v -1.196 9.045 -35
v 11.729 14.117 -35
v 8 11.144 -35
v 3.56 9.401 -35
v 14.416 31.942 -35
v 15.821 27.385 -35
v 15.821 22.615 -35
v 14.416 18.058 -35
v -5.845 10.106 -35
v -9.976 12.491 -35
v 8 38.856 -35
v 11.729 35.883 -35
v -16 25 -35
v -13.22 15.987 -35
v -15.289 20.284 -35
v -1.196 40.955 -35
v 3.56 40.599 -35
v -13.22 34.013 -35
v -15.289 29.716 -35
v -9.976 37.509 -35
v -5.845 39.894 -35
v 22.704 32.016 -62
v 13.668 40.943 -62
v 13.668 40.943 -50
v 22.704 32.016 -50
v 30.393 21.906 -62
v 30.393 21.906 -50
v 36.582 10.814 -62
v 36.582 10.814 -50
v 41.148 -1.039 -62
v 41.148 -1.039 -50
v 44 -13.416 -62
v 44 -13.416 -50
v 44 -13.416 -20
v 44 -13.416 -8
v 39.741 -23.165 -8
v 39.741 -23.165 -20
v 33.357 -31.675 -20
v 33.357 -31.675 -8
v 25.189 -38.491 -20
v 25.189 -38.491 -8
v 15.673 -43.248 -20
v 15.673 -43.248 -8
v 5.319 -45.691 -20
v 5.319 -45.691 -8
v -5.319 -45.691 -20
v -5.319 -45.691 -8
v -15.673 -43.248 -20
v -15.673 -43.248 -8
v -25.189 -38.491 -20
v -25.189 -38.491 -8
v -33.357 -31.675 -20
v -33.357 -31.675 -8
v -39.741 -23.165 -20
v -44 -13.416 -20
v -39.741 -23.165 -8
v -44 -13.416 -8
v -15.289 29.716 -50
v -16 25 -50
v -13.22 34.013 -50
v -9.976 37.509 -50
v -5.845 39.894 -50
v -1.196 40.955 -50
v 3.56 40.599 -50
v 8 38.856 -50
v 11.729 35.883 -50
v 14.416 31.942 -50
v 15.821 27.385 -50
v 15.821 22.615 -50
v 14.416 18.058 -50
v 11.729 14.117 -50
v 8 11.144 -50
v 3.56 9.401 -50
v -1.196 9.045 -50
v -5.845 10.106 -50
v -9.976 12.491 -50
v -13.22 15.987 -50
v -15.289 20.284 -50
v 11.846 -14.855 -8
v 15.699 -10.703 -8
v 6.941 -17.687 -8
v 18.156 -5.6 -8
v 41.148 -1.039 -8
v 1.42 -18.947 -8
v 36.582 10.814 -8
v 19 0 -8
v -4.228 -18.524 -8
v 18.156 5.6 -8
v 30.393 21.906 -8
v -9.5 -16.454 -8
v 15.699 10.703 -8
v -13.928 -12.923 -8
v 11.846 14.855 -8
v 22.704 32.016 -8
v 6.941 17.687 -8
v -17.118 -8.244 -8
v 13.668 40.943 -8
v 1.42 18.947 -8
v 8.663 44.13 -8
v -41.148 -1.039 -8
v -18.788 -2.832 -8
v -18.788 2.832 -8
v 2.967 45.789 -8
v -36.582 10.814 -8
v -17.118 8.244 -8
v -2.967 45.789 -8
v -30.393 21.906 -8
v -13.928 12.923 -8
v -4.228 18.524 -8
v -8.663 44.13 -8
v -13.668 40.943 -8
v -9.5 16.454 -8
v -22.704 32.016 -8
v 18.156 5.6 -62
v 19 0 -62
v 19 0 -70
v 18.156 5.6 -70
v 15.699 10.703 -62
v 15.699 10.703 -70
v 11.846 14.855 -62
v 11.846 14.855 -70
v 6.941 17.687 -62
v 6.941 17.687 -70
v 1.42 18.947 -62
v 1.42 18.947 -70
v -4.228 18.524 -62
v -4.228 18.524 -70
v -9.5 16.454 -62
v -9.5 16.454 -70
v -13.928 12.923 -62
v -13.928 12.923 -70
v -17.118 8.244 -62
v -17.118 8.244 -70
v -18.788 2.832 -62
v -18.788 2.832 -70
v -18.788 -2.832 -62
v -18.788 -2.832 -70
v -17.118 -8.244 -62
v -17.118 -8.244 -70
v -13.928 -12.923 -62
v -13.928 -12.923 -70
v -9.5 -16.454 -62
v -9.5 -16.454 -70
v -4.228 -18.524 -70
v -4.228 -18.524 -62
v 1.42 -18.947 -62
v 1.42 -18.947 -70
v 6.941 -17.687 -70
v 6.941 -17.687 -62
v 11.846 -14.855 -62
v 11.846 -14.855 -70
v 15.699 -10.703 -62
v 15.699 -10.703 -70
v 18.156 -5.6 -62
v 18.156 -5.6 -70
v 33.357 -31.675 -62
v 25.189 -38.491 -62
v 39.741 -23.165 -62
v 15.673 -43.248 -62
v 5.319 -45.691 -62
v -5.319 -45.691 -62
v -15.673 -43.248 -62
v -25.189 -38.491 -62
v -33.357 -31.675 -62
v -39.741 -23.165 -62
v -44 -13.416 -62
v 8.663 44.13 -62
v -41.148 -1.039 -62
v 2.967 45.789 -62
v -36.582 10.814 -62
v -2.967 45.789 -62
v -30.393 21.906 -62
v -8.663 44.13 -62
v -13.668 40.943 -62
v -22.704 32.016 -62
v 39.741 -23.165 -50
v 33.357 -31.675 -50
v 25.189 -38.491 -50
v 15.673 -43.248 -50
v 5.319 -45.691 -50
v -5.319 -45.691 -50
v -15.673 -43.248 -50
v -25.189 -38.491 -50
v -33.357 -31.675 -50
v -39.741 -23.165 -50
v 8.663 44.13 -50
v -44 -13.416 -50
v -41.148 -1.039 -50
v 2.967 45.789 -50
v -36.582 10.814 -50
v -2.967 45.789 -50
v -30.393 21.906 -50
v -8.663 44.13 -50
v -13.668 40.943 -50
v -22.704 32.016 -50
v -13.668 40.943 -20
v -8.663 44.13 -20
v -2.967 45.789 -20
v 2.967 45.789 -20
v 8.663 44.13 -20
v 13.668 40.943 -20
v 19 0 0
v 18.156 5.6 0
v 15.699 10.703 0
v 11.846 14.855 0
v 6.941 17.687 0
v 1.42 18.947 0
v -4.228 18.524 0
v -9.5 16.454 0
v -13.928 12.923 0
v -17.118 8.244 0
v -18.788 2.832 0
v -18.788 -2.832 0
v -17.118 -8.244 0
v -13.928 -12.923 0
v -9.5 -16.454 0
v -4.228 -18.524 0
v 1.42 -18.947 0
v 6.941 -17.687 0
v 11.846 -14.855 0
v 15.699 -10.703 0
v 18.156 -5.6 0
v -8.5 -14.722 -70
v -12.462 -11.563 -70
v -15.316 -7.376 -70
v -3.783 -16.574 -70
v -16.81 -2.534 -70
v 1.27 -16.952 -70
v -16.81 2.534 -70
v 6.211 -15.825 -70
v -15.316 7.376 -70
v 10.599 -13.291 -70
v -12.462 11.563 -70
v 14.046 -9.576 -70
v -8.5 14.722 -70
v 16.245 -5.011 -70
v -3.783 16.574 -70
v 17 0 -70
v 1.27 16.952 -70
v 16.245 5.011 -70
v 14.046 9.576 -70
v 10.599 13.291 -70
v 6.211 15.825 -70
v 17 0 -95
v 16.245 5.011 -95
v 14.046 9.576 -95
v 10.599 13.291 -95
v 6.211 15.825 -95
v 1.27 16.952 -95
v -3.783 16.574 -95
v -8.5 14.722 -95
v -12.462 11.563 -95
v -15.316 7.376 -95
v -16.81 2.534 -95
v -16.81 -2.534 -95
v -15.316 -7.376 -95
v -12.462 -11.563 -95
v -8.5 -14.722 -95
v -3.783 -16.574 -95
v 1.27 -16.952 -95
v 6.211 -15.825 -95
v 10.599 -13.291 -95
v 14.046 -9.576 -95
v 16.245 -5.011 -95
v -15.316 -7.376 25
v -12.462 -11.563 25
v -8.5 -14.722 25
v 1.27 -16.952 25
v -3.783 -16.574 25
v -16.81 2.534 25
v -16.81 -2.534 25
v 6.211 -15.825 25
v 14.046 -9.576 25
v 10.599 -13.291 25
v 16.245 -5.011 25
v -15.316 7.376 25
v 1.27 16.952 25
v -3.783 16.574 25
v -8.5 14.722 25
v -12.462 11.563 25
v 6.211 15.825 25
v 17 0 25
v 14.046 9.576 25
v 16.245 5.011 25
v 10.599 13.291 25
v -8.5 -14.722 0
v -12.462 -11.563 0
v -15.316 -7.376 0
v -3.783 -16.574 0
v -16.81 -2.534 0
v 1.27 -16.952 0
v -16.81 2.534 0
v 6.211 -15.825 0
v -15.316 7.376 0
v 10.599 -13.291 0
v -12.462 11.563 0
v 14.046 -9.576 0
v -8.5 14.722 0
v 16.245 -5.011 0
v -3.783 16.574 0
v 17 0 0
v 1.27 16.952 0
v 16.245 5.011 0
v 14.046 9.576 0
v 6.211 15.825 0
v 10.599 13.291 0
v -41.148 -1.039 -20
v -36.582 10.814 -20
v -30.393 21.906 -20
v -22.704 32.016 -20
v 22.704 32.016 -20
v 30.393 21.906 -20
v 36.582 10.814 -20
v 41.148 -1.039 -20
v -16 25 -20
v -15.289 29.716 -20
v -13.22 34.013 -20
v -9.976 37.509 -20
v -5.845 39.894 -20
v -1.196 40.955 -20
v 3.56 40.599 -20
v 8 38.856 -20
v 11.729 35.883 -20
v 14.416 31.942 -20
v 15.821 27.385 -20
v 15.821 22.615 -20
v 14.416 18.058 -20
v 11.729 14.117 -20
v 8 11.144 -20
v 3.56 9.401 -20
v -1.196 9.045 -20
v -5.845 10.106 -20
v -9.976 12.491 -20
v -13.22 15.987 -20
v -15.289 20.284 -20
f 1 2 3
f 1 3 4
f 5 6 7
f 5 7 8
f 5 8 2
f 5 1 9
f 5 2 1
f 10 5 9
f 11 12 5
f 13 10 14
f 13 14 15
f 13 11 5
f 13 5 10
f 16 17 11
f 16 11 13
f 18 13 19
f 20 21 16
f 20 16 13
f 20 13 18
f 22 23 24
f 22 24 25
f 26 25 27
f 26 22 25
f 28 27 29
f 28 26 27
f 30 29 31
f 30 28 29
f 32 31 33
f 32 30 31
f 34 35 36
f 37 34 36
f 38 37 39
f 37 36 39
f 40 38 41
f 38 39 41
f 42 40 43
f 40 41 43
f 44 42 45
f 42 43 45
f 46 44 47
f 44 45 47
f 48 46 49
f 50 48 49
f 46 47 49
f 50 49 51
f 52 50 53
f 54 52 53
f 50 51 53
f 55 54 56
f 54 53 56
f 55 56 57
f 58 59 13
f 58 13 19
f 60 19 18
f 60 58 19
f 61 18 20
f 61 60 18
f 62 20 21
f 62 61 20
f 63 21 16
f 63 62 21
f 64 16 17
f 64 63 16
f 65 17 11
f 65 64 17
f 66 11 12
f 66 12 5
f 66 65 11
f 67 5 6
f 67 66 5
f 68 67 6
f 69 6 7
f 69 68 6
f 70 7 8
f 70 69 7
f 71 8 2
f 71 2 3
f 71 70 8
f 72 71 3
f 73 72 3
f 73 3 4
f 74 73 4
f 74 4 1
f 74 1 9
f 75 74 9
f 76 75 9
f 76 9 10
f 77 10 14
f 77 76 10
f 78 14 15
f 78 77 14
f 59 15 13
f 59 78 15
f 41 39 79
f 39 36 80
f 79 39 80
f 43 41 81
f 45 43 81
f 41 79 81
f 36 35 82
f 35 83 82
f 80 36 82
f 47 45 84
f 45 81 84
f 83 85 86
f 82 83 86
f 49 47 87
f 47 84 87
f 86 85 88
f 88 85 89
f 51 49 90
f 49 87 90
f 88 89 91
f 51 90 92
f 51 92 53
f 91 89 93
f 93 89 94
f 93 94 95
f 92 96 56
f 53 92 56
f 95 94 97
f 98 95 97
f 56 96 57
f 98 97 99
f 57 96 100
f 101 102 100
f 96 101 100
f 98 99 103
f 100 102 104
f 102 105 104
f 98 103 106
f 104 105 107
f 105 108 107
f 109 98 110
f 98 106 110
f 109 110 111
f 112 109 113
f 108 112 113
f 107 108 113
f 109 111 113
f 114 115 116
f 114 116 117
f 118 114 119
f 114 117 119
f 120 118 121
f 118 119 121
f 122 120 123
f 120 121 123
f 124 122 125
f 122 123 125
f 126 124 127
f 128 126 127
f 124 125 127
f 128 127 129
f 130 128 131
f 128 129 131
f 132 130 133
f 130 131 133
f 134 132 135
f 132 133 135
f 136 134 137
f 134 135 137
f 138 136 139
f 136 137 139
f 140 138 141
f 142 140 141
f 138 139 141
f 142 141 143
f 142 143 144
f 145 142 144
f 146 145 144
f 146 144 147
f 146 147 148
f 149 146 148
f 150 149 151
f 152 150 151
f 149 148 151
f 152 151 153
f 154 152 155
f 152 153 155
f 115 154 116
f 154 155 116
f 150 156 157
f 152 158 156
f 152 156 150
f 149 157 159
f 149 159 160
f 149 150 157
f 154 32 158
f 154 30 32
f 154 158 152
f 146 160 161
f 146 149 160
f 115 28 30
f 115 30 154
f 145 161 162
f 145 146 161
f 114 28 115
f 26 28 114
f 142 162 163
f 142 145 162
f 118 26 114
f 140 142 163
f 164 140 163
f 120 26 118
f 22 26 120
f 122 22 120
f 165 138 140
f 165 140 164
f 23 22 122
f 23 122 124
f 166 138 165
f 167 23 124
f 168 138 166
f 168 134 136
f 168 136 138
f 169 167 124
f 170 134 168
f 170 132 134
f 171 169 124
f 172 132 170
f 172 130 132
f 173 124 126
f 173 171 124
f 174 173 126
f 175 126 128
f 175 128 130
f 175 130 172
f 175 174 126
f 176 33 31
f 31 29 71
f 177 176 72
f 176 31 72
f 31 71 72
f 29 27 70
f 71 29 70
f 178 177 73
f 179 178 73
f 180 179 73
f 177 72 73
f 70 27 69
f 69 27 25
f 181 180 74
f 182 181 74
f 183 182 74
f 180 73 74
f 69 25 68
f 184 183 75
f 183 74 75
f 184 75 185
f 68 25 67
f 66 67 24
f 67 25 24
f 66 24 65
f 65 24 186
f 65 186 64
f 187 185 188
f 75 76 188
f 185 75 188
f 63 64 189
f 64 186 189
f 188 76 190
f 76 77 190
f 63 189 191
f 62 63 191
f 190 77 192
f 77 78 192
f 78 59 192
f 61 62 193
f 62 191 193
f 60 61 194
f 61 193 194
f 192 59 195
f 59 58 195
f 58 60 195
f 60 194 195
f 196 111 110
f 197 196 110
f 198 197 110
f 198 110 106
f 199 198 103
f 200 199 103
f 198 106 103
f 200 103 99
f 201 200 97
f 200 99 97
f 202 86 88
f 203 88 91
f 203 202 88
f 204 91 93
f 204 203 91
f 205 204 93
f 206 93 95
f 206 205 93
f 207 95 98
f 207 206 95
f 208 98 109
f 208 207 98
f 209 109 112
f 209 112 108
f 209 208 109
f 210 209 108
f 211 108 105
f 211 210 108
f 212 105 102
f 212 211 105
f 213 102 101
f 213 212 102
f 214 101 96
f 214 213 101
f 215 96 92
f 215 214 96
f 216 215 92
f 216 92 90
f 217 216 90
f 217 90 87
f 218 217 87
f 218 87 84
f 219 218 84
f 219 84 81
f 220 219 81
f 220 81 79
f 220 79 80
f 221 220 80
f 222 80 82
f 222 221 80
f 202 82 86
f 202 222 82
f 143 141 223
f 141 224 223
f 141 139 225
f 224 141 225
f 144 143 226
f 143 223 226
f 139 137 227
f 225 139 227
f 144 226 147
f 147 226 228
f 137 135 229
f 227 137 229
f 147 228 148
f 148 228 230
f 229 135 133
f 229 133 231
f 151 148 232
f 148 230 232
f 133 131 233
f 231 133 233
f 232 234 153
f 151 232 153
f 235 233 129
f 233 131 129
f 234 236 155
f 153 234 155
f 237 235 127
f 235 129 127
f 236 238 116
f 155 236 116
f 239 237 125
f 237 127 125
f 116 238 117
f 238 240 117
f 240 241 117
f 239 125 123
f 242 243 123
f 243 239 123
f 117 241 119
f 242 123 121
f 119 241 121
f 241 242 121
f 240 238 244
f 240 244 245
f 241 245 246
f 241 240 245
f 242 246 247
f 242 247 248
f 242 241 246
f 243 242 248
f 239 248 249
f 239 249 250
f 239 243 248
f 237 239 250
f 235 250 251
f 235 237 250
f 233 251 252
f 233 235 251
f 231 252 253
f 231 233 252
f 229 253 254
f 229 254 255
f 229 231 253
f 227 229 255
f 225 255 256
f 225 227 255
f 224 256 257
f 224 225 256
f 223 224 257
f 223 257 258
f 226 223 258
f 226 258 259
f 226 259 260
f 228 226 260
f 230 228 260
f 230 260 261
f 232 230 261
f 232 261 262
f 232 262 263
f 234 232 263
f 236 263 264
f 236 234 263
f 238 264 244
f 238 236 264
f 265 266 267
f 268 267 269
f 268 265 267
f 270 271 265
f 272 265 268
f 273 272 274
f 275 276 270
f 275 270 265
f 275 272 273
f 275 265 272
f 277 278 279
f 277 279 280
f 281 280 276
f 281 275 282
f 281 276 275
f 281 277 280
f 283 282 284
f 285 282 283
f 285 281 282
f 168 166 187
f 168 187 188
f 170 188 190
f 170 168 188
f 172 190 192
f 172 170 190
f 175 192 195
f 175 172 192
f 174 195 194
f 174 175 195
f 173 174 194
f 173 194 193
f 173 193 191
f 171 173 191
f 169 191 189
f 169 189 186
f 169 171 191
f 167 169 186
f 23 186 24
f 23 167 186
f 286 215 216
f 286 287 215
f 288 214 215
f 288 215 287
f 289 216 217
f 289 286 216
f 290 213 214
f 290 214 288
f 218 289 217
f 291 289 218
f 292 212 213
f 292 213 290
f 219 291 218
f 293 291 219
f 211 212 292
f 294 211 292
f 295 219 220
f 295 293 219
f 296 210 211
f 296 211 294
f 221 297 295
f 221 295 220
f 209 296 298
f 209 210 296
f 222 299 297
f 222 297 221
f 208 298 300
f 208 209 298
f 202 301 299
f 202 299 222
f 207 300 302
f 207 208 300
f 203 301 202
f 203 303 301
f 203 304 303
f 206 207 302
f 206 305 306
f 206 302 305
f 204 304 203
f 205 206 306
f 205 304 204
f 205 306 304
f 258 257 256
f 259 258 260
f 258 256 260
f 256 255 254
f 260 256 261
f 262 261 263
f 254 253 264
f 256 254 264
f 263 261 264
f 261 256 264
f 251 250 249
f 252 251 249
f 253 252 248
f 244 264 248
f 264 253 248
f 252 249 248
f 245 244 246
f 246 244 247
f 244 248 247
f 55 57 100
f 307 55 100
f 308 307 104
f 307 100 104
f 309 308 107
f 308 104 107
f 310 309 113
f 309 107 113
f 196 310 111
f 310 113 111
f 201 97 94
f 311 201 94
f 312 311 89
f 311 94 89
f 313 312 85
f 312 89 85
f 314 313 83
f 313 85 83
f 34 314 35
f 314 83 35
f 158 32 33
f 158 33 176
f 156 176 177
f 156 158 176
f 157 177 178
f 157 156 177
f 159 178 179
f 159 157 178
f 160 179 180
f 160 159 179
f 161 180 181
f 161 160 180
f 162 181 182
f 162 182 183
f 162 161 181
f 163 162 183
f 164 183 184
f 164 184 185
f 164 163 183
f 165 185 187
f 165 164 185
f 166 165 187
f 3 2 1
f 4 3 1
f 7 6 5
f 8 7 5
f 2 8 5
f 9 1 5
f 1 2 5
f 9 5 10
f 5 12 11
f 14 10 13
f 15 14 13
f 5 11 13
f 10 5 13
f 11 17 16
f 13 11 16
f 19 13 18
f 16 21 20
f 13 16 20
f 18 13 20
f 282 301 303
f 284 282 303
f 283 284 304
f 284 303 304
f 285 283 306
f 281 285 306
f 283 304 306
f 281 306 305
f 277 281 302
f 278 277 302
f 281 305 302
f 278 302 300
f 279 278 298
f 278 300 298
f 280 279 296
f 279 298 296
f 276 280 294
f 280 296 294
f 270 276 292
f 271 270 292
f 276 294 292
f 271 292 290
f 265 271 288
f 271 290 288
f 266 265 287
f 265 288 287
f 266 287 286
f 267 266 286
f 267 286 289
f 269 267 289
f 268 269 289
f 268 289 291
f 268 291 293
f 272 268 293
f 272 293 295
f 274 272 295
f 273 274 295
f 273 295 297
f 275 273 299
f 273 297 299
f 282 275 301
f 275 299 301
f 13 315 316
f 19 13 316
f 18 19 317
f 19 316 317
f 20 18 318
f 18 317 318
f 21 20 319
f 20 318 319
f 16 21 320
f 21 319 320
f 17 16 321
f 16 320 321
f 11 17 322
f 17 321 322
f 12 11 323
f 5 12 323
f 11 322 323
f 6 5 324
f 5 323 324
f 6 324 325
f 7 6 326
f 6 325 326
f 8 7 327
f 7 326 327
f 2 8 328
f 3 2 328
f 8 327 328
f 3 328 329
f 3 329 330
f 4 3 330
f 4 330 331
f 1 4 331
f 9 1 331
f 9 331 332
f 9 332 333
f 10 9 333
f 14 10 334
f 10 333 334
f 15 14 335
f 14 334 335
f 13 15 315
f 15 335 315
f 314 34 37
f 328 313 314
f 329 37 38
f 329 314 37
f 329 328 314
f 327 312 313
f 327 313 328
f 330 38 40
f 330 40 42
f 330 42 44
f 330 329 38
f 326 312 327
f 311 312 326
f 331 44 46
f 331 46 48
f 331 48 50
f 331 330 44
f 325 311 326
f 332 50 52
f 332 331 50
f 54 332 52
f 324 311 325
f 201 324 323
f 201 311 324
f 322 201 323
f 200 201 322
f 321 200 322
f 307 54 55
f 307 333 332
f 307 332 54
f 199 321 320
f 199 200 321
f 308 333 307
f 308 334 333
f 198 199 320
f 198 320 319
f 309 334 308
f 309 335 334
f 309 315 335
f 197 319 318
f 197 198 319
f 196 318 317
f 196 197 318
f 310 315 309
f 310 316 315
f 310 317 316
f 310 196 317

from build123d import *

# Parameters (mm, degrees)
SKETCH1_R           = 17
BOSS_EXTRUDE1_DEPTH = 25
SKETCH2_R           = 19
BOSS_EXTRUDE2_DEPTH = 8
BOSS_EXTRUDE3_DEPTH = 12
SKETCH4_R           = 16
BOSS_EXTRUDE4_DEPTH = 15


with BuildPart() as part:
    # Sketch1 → Boss-Extrude1 (new body)
    with BuildSketch(Plane.XY):
        Circle(SKETCH1_R)
    extrude(amount=BOSS_EXTRUDE1_DEPTH)

    # Sketch2 → Boss-Extrude2 (add)
    with BuildSketch(Plane.XY):
        Circle(SKETCH2_R)
    extrude(amount=-BOSS_EXTRUDE2_DEPTH)

    # Sketch3 → Boss-Extrude3 (add)
    with BuildSketch(Plane(origin=(0, 0, -8), x_dir=(-1, 0, 0), z_dir=(0, 0, -1))):
        with BuildLine():
            ThreePointArc((-44, -13.416407865), (0, -46), (44, -13.416407865))
            ThreePointArc((44, -13.416407865), (33.683444249, 16.469257624), (13.668094758, 40.943123461))
            ThreePointArc((13.668094758, 40.943123461), (0, 46), (-13.668094758, 40.943123461))
            ThreePointArc((-13.668094758, 40.943123461), (-33.683444249, 16.469257624), (-44, -13.416407865))
        make_face()
    extrude(amount=BOSS_EXTRUDE3_DEPTH)

    # Sketch4 → Boss-Extrude4 (add)
    with BuildSketch(Plane(origin=(0, 0, -20), x_dir=(-1, 0, 0), z_dir=(0, 0, -1))):
        with Locations((0, 25)):
            Circle(SKETCH4_R)
    extrude(amount=BOSS_EXTRUDE4_DEPTH)


with BuildPart() as body_2:
    # Mirror1: mirrored copy
    add(part.part.mirror(Plane(origin=(0, 25, -35), x_dir=(1, 0, 0), z_dir=(0, 0, -1))))


solid = Compound([part.part, body_2.part])
